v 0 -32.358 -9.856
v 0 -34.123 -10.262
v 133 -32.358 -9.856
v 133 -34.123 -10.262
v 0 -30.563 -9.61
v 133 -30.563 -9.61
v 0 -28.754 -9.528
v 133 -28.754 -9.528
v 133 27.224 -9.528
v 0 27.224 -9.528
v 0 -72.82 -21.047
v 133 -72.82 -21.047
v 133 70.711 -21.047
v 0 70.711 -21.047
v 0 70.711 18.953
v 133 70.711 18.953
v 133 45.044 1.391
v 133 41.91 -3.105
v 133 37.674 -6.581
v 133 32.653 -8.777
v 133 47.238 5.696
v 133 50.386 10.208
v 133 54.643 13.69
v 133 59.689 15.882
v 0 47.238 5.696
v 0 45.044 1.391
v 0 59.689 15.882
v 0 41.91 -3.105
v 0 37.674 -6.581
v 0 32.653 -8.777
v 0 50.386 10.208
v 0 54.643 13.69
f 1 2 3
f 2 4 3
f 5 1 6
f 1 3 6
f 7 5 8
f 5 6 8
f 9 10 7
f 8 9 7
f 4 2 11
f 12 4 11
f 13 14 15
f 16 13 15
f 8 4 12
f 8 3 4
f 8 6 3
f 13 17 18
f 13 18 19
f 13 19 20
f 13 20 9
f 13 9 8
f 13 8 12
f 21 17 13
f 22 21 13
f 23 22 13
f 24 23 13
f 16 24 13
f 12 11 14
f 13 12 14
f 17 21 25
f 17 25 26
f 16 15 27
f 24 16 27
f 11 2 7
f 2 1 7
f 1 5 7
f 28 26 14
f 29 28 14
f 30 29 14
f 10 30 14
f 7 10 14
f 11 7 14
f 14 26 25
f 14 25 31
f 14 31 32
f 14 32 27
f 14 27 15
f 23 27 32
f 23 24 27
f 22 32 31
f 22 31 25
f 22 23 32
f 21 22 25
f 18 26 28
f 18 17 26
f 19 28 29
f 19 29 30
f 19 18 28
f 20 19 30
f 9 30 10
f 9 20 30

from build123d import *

# Parameters (mm, degrees)
F1_DEPTH = 133
F2_R     = 20


with BuildPart() as f1:
    # F0 (on Right) → F1 (new body)
    with BuildSketch(Plane.YZ):
        Polygon((-31.488675, -9.528097), (-72.819769, -21.046512), (70.710715, -21.046512), (70.710715, 18.953488), (51.226363, 13.523463), (39.479751, -9.528097), align=None)
    extrude(amount=F1_DEPTH)

    # F2
    f2_edges = [f1.edges().sort_by_distance(p)[0] for p in [
        (66.5, 39.479751, -9.528097),
        (66.5, -31.488675, -9.528097),
        (66.5, 51.226363, 13.523463),
    ]]
    fillet(f2_edges, radius=F2_R)


solid = f1.part
